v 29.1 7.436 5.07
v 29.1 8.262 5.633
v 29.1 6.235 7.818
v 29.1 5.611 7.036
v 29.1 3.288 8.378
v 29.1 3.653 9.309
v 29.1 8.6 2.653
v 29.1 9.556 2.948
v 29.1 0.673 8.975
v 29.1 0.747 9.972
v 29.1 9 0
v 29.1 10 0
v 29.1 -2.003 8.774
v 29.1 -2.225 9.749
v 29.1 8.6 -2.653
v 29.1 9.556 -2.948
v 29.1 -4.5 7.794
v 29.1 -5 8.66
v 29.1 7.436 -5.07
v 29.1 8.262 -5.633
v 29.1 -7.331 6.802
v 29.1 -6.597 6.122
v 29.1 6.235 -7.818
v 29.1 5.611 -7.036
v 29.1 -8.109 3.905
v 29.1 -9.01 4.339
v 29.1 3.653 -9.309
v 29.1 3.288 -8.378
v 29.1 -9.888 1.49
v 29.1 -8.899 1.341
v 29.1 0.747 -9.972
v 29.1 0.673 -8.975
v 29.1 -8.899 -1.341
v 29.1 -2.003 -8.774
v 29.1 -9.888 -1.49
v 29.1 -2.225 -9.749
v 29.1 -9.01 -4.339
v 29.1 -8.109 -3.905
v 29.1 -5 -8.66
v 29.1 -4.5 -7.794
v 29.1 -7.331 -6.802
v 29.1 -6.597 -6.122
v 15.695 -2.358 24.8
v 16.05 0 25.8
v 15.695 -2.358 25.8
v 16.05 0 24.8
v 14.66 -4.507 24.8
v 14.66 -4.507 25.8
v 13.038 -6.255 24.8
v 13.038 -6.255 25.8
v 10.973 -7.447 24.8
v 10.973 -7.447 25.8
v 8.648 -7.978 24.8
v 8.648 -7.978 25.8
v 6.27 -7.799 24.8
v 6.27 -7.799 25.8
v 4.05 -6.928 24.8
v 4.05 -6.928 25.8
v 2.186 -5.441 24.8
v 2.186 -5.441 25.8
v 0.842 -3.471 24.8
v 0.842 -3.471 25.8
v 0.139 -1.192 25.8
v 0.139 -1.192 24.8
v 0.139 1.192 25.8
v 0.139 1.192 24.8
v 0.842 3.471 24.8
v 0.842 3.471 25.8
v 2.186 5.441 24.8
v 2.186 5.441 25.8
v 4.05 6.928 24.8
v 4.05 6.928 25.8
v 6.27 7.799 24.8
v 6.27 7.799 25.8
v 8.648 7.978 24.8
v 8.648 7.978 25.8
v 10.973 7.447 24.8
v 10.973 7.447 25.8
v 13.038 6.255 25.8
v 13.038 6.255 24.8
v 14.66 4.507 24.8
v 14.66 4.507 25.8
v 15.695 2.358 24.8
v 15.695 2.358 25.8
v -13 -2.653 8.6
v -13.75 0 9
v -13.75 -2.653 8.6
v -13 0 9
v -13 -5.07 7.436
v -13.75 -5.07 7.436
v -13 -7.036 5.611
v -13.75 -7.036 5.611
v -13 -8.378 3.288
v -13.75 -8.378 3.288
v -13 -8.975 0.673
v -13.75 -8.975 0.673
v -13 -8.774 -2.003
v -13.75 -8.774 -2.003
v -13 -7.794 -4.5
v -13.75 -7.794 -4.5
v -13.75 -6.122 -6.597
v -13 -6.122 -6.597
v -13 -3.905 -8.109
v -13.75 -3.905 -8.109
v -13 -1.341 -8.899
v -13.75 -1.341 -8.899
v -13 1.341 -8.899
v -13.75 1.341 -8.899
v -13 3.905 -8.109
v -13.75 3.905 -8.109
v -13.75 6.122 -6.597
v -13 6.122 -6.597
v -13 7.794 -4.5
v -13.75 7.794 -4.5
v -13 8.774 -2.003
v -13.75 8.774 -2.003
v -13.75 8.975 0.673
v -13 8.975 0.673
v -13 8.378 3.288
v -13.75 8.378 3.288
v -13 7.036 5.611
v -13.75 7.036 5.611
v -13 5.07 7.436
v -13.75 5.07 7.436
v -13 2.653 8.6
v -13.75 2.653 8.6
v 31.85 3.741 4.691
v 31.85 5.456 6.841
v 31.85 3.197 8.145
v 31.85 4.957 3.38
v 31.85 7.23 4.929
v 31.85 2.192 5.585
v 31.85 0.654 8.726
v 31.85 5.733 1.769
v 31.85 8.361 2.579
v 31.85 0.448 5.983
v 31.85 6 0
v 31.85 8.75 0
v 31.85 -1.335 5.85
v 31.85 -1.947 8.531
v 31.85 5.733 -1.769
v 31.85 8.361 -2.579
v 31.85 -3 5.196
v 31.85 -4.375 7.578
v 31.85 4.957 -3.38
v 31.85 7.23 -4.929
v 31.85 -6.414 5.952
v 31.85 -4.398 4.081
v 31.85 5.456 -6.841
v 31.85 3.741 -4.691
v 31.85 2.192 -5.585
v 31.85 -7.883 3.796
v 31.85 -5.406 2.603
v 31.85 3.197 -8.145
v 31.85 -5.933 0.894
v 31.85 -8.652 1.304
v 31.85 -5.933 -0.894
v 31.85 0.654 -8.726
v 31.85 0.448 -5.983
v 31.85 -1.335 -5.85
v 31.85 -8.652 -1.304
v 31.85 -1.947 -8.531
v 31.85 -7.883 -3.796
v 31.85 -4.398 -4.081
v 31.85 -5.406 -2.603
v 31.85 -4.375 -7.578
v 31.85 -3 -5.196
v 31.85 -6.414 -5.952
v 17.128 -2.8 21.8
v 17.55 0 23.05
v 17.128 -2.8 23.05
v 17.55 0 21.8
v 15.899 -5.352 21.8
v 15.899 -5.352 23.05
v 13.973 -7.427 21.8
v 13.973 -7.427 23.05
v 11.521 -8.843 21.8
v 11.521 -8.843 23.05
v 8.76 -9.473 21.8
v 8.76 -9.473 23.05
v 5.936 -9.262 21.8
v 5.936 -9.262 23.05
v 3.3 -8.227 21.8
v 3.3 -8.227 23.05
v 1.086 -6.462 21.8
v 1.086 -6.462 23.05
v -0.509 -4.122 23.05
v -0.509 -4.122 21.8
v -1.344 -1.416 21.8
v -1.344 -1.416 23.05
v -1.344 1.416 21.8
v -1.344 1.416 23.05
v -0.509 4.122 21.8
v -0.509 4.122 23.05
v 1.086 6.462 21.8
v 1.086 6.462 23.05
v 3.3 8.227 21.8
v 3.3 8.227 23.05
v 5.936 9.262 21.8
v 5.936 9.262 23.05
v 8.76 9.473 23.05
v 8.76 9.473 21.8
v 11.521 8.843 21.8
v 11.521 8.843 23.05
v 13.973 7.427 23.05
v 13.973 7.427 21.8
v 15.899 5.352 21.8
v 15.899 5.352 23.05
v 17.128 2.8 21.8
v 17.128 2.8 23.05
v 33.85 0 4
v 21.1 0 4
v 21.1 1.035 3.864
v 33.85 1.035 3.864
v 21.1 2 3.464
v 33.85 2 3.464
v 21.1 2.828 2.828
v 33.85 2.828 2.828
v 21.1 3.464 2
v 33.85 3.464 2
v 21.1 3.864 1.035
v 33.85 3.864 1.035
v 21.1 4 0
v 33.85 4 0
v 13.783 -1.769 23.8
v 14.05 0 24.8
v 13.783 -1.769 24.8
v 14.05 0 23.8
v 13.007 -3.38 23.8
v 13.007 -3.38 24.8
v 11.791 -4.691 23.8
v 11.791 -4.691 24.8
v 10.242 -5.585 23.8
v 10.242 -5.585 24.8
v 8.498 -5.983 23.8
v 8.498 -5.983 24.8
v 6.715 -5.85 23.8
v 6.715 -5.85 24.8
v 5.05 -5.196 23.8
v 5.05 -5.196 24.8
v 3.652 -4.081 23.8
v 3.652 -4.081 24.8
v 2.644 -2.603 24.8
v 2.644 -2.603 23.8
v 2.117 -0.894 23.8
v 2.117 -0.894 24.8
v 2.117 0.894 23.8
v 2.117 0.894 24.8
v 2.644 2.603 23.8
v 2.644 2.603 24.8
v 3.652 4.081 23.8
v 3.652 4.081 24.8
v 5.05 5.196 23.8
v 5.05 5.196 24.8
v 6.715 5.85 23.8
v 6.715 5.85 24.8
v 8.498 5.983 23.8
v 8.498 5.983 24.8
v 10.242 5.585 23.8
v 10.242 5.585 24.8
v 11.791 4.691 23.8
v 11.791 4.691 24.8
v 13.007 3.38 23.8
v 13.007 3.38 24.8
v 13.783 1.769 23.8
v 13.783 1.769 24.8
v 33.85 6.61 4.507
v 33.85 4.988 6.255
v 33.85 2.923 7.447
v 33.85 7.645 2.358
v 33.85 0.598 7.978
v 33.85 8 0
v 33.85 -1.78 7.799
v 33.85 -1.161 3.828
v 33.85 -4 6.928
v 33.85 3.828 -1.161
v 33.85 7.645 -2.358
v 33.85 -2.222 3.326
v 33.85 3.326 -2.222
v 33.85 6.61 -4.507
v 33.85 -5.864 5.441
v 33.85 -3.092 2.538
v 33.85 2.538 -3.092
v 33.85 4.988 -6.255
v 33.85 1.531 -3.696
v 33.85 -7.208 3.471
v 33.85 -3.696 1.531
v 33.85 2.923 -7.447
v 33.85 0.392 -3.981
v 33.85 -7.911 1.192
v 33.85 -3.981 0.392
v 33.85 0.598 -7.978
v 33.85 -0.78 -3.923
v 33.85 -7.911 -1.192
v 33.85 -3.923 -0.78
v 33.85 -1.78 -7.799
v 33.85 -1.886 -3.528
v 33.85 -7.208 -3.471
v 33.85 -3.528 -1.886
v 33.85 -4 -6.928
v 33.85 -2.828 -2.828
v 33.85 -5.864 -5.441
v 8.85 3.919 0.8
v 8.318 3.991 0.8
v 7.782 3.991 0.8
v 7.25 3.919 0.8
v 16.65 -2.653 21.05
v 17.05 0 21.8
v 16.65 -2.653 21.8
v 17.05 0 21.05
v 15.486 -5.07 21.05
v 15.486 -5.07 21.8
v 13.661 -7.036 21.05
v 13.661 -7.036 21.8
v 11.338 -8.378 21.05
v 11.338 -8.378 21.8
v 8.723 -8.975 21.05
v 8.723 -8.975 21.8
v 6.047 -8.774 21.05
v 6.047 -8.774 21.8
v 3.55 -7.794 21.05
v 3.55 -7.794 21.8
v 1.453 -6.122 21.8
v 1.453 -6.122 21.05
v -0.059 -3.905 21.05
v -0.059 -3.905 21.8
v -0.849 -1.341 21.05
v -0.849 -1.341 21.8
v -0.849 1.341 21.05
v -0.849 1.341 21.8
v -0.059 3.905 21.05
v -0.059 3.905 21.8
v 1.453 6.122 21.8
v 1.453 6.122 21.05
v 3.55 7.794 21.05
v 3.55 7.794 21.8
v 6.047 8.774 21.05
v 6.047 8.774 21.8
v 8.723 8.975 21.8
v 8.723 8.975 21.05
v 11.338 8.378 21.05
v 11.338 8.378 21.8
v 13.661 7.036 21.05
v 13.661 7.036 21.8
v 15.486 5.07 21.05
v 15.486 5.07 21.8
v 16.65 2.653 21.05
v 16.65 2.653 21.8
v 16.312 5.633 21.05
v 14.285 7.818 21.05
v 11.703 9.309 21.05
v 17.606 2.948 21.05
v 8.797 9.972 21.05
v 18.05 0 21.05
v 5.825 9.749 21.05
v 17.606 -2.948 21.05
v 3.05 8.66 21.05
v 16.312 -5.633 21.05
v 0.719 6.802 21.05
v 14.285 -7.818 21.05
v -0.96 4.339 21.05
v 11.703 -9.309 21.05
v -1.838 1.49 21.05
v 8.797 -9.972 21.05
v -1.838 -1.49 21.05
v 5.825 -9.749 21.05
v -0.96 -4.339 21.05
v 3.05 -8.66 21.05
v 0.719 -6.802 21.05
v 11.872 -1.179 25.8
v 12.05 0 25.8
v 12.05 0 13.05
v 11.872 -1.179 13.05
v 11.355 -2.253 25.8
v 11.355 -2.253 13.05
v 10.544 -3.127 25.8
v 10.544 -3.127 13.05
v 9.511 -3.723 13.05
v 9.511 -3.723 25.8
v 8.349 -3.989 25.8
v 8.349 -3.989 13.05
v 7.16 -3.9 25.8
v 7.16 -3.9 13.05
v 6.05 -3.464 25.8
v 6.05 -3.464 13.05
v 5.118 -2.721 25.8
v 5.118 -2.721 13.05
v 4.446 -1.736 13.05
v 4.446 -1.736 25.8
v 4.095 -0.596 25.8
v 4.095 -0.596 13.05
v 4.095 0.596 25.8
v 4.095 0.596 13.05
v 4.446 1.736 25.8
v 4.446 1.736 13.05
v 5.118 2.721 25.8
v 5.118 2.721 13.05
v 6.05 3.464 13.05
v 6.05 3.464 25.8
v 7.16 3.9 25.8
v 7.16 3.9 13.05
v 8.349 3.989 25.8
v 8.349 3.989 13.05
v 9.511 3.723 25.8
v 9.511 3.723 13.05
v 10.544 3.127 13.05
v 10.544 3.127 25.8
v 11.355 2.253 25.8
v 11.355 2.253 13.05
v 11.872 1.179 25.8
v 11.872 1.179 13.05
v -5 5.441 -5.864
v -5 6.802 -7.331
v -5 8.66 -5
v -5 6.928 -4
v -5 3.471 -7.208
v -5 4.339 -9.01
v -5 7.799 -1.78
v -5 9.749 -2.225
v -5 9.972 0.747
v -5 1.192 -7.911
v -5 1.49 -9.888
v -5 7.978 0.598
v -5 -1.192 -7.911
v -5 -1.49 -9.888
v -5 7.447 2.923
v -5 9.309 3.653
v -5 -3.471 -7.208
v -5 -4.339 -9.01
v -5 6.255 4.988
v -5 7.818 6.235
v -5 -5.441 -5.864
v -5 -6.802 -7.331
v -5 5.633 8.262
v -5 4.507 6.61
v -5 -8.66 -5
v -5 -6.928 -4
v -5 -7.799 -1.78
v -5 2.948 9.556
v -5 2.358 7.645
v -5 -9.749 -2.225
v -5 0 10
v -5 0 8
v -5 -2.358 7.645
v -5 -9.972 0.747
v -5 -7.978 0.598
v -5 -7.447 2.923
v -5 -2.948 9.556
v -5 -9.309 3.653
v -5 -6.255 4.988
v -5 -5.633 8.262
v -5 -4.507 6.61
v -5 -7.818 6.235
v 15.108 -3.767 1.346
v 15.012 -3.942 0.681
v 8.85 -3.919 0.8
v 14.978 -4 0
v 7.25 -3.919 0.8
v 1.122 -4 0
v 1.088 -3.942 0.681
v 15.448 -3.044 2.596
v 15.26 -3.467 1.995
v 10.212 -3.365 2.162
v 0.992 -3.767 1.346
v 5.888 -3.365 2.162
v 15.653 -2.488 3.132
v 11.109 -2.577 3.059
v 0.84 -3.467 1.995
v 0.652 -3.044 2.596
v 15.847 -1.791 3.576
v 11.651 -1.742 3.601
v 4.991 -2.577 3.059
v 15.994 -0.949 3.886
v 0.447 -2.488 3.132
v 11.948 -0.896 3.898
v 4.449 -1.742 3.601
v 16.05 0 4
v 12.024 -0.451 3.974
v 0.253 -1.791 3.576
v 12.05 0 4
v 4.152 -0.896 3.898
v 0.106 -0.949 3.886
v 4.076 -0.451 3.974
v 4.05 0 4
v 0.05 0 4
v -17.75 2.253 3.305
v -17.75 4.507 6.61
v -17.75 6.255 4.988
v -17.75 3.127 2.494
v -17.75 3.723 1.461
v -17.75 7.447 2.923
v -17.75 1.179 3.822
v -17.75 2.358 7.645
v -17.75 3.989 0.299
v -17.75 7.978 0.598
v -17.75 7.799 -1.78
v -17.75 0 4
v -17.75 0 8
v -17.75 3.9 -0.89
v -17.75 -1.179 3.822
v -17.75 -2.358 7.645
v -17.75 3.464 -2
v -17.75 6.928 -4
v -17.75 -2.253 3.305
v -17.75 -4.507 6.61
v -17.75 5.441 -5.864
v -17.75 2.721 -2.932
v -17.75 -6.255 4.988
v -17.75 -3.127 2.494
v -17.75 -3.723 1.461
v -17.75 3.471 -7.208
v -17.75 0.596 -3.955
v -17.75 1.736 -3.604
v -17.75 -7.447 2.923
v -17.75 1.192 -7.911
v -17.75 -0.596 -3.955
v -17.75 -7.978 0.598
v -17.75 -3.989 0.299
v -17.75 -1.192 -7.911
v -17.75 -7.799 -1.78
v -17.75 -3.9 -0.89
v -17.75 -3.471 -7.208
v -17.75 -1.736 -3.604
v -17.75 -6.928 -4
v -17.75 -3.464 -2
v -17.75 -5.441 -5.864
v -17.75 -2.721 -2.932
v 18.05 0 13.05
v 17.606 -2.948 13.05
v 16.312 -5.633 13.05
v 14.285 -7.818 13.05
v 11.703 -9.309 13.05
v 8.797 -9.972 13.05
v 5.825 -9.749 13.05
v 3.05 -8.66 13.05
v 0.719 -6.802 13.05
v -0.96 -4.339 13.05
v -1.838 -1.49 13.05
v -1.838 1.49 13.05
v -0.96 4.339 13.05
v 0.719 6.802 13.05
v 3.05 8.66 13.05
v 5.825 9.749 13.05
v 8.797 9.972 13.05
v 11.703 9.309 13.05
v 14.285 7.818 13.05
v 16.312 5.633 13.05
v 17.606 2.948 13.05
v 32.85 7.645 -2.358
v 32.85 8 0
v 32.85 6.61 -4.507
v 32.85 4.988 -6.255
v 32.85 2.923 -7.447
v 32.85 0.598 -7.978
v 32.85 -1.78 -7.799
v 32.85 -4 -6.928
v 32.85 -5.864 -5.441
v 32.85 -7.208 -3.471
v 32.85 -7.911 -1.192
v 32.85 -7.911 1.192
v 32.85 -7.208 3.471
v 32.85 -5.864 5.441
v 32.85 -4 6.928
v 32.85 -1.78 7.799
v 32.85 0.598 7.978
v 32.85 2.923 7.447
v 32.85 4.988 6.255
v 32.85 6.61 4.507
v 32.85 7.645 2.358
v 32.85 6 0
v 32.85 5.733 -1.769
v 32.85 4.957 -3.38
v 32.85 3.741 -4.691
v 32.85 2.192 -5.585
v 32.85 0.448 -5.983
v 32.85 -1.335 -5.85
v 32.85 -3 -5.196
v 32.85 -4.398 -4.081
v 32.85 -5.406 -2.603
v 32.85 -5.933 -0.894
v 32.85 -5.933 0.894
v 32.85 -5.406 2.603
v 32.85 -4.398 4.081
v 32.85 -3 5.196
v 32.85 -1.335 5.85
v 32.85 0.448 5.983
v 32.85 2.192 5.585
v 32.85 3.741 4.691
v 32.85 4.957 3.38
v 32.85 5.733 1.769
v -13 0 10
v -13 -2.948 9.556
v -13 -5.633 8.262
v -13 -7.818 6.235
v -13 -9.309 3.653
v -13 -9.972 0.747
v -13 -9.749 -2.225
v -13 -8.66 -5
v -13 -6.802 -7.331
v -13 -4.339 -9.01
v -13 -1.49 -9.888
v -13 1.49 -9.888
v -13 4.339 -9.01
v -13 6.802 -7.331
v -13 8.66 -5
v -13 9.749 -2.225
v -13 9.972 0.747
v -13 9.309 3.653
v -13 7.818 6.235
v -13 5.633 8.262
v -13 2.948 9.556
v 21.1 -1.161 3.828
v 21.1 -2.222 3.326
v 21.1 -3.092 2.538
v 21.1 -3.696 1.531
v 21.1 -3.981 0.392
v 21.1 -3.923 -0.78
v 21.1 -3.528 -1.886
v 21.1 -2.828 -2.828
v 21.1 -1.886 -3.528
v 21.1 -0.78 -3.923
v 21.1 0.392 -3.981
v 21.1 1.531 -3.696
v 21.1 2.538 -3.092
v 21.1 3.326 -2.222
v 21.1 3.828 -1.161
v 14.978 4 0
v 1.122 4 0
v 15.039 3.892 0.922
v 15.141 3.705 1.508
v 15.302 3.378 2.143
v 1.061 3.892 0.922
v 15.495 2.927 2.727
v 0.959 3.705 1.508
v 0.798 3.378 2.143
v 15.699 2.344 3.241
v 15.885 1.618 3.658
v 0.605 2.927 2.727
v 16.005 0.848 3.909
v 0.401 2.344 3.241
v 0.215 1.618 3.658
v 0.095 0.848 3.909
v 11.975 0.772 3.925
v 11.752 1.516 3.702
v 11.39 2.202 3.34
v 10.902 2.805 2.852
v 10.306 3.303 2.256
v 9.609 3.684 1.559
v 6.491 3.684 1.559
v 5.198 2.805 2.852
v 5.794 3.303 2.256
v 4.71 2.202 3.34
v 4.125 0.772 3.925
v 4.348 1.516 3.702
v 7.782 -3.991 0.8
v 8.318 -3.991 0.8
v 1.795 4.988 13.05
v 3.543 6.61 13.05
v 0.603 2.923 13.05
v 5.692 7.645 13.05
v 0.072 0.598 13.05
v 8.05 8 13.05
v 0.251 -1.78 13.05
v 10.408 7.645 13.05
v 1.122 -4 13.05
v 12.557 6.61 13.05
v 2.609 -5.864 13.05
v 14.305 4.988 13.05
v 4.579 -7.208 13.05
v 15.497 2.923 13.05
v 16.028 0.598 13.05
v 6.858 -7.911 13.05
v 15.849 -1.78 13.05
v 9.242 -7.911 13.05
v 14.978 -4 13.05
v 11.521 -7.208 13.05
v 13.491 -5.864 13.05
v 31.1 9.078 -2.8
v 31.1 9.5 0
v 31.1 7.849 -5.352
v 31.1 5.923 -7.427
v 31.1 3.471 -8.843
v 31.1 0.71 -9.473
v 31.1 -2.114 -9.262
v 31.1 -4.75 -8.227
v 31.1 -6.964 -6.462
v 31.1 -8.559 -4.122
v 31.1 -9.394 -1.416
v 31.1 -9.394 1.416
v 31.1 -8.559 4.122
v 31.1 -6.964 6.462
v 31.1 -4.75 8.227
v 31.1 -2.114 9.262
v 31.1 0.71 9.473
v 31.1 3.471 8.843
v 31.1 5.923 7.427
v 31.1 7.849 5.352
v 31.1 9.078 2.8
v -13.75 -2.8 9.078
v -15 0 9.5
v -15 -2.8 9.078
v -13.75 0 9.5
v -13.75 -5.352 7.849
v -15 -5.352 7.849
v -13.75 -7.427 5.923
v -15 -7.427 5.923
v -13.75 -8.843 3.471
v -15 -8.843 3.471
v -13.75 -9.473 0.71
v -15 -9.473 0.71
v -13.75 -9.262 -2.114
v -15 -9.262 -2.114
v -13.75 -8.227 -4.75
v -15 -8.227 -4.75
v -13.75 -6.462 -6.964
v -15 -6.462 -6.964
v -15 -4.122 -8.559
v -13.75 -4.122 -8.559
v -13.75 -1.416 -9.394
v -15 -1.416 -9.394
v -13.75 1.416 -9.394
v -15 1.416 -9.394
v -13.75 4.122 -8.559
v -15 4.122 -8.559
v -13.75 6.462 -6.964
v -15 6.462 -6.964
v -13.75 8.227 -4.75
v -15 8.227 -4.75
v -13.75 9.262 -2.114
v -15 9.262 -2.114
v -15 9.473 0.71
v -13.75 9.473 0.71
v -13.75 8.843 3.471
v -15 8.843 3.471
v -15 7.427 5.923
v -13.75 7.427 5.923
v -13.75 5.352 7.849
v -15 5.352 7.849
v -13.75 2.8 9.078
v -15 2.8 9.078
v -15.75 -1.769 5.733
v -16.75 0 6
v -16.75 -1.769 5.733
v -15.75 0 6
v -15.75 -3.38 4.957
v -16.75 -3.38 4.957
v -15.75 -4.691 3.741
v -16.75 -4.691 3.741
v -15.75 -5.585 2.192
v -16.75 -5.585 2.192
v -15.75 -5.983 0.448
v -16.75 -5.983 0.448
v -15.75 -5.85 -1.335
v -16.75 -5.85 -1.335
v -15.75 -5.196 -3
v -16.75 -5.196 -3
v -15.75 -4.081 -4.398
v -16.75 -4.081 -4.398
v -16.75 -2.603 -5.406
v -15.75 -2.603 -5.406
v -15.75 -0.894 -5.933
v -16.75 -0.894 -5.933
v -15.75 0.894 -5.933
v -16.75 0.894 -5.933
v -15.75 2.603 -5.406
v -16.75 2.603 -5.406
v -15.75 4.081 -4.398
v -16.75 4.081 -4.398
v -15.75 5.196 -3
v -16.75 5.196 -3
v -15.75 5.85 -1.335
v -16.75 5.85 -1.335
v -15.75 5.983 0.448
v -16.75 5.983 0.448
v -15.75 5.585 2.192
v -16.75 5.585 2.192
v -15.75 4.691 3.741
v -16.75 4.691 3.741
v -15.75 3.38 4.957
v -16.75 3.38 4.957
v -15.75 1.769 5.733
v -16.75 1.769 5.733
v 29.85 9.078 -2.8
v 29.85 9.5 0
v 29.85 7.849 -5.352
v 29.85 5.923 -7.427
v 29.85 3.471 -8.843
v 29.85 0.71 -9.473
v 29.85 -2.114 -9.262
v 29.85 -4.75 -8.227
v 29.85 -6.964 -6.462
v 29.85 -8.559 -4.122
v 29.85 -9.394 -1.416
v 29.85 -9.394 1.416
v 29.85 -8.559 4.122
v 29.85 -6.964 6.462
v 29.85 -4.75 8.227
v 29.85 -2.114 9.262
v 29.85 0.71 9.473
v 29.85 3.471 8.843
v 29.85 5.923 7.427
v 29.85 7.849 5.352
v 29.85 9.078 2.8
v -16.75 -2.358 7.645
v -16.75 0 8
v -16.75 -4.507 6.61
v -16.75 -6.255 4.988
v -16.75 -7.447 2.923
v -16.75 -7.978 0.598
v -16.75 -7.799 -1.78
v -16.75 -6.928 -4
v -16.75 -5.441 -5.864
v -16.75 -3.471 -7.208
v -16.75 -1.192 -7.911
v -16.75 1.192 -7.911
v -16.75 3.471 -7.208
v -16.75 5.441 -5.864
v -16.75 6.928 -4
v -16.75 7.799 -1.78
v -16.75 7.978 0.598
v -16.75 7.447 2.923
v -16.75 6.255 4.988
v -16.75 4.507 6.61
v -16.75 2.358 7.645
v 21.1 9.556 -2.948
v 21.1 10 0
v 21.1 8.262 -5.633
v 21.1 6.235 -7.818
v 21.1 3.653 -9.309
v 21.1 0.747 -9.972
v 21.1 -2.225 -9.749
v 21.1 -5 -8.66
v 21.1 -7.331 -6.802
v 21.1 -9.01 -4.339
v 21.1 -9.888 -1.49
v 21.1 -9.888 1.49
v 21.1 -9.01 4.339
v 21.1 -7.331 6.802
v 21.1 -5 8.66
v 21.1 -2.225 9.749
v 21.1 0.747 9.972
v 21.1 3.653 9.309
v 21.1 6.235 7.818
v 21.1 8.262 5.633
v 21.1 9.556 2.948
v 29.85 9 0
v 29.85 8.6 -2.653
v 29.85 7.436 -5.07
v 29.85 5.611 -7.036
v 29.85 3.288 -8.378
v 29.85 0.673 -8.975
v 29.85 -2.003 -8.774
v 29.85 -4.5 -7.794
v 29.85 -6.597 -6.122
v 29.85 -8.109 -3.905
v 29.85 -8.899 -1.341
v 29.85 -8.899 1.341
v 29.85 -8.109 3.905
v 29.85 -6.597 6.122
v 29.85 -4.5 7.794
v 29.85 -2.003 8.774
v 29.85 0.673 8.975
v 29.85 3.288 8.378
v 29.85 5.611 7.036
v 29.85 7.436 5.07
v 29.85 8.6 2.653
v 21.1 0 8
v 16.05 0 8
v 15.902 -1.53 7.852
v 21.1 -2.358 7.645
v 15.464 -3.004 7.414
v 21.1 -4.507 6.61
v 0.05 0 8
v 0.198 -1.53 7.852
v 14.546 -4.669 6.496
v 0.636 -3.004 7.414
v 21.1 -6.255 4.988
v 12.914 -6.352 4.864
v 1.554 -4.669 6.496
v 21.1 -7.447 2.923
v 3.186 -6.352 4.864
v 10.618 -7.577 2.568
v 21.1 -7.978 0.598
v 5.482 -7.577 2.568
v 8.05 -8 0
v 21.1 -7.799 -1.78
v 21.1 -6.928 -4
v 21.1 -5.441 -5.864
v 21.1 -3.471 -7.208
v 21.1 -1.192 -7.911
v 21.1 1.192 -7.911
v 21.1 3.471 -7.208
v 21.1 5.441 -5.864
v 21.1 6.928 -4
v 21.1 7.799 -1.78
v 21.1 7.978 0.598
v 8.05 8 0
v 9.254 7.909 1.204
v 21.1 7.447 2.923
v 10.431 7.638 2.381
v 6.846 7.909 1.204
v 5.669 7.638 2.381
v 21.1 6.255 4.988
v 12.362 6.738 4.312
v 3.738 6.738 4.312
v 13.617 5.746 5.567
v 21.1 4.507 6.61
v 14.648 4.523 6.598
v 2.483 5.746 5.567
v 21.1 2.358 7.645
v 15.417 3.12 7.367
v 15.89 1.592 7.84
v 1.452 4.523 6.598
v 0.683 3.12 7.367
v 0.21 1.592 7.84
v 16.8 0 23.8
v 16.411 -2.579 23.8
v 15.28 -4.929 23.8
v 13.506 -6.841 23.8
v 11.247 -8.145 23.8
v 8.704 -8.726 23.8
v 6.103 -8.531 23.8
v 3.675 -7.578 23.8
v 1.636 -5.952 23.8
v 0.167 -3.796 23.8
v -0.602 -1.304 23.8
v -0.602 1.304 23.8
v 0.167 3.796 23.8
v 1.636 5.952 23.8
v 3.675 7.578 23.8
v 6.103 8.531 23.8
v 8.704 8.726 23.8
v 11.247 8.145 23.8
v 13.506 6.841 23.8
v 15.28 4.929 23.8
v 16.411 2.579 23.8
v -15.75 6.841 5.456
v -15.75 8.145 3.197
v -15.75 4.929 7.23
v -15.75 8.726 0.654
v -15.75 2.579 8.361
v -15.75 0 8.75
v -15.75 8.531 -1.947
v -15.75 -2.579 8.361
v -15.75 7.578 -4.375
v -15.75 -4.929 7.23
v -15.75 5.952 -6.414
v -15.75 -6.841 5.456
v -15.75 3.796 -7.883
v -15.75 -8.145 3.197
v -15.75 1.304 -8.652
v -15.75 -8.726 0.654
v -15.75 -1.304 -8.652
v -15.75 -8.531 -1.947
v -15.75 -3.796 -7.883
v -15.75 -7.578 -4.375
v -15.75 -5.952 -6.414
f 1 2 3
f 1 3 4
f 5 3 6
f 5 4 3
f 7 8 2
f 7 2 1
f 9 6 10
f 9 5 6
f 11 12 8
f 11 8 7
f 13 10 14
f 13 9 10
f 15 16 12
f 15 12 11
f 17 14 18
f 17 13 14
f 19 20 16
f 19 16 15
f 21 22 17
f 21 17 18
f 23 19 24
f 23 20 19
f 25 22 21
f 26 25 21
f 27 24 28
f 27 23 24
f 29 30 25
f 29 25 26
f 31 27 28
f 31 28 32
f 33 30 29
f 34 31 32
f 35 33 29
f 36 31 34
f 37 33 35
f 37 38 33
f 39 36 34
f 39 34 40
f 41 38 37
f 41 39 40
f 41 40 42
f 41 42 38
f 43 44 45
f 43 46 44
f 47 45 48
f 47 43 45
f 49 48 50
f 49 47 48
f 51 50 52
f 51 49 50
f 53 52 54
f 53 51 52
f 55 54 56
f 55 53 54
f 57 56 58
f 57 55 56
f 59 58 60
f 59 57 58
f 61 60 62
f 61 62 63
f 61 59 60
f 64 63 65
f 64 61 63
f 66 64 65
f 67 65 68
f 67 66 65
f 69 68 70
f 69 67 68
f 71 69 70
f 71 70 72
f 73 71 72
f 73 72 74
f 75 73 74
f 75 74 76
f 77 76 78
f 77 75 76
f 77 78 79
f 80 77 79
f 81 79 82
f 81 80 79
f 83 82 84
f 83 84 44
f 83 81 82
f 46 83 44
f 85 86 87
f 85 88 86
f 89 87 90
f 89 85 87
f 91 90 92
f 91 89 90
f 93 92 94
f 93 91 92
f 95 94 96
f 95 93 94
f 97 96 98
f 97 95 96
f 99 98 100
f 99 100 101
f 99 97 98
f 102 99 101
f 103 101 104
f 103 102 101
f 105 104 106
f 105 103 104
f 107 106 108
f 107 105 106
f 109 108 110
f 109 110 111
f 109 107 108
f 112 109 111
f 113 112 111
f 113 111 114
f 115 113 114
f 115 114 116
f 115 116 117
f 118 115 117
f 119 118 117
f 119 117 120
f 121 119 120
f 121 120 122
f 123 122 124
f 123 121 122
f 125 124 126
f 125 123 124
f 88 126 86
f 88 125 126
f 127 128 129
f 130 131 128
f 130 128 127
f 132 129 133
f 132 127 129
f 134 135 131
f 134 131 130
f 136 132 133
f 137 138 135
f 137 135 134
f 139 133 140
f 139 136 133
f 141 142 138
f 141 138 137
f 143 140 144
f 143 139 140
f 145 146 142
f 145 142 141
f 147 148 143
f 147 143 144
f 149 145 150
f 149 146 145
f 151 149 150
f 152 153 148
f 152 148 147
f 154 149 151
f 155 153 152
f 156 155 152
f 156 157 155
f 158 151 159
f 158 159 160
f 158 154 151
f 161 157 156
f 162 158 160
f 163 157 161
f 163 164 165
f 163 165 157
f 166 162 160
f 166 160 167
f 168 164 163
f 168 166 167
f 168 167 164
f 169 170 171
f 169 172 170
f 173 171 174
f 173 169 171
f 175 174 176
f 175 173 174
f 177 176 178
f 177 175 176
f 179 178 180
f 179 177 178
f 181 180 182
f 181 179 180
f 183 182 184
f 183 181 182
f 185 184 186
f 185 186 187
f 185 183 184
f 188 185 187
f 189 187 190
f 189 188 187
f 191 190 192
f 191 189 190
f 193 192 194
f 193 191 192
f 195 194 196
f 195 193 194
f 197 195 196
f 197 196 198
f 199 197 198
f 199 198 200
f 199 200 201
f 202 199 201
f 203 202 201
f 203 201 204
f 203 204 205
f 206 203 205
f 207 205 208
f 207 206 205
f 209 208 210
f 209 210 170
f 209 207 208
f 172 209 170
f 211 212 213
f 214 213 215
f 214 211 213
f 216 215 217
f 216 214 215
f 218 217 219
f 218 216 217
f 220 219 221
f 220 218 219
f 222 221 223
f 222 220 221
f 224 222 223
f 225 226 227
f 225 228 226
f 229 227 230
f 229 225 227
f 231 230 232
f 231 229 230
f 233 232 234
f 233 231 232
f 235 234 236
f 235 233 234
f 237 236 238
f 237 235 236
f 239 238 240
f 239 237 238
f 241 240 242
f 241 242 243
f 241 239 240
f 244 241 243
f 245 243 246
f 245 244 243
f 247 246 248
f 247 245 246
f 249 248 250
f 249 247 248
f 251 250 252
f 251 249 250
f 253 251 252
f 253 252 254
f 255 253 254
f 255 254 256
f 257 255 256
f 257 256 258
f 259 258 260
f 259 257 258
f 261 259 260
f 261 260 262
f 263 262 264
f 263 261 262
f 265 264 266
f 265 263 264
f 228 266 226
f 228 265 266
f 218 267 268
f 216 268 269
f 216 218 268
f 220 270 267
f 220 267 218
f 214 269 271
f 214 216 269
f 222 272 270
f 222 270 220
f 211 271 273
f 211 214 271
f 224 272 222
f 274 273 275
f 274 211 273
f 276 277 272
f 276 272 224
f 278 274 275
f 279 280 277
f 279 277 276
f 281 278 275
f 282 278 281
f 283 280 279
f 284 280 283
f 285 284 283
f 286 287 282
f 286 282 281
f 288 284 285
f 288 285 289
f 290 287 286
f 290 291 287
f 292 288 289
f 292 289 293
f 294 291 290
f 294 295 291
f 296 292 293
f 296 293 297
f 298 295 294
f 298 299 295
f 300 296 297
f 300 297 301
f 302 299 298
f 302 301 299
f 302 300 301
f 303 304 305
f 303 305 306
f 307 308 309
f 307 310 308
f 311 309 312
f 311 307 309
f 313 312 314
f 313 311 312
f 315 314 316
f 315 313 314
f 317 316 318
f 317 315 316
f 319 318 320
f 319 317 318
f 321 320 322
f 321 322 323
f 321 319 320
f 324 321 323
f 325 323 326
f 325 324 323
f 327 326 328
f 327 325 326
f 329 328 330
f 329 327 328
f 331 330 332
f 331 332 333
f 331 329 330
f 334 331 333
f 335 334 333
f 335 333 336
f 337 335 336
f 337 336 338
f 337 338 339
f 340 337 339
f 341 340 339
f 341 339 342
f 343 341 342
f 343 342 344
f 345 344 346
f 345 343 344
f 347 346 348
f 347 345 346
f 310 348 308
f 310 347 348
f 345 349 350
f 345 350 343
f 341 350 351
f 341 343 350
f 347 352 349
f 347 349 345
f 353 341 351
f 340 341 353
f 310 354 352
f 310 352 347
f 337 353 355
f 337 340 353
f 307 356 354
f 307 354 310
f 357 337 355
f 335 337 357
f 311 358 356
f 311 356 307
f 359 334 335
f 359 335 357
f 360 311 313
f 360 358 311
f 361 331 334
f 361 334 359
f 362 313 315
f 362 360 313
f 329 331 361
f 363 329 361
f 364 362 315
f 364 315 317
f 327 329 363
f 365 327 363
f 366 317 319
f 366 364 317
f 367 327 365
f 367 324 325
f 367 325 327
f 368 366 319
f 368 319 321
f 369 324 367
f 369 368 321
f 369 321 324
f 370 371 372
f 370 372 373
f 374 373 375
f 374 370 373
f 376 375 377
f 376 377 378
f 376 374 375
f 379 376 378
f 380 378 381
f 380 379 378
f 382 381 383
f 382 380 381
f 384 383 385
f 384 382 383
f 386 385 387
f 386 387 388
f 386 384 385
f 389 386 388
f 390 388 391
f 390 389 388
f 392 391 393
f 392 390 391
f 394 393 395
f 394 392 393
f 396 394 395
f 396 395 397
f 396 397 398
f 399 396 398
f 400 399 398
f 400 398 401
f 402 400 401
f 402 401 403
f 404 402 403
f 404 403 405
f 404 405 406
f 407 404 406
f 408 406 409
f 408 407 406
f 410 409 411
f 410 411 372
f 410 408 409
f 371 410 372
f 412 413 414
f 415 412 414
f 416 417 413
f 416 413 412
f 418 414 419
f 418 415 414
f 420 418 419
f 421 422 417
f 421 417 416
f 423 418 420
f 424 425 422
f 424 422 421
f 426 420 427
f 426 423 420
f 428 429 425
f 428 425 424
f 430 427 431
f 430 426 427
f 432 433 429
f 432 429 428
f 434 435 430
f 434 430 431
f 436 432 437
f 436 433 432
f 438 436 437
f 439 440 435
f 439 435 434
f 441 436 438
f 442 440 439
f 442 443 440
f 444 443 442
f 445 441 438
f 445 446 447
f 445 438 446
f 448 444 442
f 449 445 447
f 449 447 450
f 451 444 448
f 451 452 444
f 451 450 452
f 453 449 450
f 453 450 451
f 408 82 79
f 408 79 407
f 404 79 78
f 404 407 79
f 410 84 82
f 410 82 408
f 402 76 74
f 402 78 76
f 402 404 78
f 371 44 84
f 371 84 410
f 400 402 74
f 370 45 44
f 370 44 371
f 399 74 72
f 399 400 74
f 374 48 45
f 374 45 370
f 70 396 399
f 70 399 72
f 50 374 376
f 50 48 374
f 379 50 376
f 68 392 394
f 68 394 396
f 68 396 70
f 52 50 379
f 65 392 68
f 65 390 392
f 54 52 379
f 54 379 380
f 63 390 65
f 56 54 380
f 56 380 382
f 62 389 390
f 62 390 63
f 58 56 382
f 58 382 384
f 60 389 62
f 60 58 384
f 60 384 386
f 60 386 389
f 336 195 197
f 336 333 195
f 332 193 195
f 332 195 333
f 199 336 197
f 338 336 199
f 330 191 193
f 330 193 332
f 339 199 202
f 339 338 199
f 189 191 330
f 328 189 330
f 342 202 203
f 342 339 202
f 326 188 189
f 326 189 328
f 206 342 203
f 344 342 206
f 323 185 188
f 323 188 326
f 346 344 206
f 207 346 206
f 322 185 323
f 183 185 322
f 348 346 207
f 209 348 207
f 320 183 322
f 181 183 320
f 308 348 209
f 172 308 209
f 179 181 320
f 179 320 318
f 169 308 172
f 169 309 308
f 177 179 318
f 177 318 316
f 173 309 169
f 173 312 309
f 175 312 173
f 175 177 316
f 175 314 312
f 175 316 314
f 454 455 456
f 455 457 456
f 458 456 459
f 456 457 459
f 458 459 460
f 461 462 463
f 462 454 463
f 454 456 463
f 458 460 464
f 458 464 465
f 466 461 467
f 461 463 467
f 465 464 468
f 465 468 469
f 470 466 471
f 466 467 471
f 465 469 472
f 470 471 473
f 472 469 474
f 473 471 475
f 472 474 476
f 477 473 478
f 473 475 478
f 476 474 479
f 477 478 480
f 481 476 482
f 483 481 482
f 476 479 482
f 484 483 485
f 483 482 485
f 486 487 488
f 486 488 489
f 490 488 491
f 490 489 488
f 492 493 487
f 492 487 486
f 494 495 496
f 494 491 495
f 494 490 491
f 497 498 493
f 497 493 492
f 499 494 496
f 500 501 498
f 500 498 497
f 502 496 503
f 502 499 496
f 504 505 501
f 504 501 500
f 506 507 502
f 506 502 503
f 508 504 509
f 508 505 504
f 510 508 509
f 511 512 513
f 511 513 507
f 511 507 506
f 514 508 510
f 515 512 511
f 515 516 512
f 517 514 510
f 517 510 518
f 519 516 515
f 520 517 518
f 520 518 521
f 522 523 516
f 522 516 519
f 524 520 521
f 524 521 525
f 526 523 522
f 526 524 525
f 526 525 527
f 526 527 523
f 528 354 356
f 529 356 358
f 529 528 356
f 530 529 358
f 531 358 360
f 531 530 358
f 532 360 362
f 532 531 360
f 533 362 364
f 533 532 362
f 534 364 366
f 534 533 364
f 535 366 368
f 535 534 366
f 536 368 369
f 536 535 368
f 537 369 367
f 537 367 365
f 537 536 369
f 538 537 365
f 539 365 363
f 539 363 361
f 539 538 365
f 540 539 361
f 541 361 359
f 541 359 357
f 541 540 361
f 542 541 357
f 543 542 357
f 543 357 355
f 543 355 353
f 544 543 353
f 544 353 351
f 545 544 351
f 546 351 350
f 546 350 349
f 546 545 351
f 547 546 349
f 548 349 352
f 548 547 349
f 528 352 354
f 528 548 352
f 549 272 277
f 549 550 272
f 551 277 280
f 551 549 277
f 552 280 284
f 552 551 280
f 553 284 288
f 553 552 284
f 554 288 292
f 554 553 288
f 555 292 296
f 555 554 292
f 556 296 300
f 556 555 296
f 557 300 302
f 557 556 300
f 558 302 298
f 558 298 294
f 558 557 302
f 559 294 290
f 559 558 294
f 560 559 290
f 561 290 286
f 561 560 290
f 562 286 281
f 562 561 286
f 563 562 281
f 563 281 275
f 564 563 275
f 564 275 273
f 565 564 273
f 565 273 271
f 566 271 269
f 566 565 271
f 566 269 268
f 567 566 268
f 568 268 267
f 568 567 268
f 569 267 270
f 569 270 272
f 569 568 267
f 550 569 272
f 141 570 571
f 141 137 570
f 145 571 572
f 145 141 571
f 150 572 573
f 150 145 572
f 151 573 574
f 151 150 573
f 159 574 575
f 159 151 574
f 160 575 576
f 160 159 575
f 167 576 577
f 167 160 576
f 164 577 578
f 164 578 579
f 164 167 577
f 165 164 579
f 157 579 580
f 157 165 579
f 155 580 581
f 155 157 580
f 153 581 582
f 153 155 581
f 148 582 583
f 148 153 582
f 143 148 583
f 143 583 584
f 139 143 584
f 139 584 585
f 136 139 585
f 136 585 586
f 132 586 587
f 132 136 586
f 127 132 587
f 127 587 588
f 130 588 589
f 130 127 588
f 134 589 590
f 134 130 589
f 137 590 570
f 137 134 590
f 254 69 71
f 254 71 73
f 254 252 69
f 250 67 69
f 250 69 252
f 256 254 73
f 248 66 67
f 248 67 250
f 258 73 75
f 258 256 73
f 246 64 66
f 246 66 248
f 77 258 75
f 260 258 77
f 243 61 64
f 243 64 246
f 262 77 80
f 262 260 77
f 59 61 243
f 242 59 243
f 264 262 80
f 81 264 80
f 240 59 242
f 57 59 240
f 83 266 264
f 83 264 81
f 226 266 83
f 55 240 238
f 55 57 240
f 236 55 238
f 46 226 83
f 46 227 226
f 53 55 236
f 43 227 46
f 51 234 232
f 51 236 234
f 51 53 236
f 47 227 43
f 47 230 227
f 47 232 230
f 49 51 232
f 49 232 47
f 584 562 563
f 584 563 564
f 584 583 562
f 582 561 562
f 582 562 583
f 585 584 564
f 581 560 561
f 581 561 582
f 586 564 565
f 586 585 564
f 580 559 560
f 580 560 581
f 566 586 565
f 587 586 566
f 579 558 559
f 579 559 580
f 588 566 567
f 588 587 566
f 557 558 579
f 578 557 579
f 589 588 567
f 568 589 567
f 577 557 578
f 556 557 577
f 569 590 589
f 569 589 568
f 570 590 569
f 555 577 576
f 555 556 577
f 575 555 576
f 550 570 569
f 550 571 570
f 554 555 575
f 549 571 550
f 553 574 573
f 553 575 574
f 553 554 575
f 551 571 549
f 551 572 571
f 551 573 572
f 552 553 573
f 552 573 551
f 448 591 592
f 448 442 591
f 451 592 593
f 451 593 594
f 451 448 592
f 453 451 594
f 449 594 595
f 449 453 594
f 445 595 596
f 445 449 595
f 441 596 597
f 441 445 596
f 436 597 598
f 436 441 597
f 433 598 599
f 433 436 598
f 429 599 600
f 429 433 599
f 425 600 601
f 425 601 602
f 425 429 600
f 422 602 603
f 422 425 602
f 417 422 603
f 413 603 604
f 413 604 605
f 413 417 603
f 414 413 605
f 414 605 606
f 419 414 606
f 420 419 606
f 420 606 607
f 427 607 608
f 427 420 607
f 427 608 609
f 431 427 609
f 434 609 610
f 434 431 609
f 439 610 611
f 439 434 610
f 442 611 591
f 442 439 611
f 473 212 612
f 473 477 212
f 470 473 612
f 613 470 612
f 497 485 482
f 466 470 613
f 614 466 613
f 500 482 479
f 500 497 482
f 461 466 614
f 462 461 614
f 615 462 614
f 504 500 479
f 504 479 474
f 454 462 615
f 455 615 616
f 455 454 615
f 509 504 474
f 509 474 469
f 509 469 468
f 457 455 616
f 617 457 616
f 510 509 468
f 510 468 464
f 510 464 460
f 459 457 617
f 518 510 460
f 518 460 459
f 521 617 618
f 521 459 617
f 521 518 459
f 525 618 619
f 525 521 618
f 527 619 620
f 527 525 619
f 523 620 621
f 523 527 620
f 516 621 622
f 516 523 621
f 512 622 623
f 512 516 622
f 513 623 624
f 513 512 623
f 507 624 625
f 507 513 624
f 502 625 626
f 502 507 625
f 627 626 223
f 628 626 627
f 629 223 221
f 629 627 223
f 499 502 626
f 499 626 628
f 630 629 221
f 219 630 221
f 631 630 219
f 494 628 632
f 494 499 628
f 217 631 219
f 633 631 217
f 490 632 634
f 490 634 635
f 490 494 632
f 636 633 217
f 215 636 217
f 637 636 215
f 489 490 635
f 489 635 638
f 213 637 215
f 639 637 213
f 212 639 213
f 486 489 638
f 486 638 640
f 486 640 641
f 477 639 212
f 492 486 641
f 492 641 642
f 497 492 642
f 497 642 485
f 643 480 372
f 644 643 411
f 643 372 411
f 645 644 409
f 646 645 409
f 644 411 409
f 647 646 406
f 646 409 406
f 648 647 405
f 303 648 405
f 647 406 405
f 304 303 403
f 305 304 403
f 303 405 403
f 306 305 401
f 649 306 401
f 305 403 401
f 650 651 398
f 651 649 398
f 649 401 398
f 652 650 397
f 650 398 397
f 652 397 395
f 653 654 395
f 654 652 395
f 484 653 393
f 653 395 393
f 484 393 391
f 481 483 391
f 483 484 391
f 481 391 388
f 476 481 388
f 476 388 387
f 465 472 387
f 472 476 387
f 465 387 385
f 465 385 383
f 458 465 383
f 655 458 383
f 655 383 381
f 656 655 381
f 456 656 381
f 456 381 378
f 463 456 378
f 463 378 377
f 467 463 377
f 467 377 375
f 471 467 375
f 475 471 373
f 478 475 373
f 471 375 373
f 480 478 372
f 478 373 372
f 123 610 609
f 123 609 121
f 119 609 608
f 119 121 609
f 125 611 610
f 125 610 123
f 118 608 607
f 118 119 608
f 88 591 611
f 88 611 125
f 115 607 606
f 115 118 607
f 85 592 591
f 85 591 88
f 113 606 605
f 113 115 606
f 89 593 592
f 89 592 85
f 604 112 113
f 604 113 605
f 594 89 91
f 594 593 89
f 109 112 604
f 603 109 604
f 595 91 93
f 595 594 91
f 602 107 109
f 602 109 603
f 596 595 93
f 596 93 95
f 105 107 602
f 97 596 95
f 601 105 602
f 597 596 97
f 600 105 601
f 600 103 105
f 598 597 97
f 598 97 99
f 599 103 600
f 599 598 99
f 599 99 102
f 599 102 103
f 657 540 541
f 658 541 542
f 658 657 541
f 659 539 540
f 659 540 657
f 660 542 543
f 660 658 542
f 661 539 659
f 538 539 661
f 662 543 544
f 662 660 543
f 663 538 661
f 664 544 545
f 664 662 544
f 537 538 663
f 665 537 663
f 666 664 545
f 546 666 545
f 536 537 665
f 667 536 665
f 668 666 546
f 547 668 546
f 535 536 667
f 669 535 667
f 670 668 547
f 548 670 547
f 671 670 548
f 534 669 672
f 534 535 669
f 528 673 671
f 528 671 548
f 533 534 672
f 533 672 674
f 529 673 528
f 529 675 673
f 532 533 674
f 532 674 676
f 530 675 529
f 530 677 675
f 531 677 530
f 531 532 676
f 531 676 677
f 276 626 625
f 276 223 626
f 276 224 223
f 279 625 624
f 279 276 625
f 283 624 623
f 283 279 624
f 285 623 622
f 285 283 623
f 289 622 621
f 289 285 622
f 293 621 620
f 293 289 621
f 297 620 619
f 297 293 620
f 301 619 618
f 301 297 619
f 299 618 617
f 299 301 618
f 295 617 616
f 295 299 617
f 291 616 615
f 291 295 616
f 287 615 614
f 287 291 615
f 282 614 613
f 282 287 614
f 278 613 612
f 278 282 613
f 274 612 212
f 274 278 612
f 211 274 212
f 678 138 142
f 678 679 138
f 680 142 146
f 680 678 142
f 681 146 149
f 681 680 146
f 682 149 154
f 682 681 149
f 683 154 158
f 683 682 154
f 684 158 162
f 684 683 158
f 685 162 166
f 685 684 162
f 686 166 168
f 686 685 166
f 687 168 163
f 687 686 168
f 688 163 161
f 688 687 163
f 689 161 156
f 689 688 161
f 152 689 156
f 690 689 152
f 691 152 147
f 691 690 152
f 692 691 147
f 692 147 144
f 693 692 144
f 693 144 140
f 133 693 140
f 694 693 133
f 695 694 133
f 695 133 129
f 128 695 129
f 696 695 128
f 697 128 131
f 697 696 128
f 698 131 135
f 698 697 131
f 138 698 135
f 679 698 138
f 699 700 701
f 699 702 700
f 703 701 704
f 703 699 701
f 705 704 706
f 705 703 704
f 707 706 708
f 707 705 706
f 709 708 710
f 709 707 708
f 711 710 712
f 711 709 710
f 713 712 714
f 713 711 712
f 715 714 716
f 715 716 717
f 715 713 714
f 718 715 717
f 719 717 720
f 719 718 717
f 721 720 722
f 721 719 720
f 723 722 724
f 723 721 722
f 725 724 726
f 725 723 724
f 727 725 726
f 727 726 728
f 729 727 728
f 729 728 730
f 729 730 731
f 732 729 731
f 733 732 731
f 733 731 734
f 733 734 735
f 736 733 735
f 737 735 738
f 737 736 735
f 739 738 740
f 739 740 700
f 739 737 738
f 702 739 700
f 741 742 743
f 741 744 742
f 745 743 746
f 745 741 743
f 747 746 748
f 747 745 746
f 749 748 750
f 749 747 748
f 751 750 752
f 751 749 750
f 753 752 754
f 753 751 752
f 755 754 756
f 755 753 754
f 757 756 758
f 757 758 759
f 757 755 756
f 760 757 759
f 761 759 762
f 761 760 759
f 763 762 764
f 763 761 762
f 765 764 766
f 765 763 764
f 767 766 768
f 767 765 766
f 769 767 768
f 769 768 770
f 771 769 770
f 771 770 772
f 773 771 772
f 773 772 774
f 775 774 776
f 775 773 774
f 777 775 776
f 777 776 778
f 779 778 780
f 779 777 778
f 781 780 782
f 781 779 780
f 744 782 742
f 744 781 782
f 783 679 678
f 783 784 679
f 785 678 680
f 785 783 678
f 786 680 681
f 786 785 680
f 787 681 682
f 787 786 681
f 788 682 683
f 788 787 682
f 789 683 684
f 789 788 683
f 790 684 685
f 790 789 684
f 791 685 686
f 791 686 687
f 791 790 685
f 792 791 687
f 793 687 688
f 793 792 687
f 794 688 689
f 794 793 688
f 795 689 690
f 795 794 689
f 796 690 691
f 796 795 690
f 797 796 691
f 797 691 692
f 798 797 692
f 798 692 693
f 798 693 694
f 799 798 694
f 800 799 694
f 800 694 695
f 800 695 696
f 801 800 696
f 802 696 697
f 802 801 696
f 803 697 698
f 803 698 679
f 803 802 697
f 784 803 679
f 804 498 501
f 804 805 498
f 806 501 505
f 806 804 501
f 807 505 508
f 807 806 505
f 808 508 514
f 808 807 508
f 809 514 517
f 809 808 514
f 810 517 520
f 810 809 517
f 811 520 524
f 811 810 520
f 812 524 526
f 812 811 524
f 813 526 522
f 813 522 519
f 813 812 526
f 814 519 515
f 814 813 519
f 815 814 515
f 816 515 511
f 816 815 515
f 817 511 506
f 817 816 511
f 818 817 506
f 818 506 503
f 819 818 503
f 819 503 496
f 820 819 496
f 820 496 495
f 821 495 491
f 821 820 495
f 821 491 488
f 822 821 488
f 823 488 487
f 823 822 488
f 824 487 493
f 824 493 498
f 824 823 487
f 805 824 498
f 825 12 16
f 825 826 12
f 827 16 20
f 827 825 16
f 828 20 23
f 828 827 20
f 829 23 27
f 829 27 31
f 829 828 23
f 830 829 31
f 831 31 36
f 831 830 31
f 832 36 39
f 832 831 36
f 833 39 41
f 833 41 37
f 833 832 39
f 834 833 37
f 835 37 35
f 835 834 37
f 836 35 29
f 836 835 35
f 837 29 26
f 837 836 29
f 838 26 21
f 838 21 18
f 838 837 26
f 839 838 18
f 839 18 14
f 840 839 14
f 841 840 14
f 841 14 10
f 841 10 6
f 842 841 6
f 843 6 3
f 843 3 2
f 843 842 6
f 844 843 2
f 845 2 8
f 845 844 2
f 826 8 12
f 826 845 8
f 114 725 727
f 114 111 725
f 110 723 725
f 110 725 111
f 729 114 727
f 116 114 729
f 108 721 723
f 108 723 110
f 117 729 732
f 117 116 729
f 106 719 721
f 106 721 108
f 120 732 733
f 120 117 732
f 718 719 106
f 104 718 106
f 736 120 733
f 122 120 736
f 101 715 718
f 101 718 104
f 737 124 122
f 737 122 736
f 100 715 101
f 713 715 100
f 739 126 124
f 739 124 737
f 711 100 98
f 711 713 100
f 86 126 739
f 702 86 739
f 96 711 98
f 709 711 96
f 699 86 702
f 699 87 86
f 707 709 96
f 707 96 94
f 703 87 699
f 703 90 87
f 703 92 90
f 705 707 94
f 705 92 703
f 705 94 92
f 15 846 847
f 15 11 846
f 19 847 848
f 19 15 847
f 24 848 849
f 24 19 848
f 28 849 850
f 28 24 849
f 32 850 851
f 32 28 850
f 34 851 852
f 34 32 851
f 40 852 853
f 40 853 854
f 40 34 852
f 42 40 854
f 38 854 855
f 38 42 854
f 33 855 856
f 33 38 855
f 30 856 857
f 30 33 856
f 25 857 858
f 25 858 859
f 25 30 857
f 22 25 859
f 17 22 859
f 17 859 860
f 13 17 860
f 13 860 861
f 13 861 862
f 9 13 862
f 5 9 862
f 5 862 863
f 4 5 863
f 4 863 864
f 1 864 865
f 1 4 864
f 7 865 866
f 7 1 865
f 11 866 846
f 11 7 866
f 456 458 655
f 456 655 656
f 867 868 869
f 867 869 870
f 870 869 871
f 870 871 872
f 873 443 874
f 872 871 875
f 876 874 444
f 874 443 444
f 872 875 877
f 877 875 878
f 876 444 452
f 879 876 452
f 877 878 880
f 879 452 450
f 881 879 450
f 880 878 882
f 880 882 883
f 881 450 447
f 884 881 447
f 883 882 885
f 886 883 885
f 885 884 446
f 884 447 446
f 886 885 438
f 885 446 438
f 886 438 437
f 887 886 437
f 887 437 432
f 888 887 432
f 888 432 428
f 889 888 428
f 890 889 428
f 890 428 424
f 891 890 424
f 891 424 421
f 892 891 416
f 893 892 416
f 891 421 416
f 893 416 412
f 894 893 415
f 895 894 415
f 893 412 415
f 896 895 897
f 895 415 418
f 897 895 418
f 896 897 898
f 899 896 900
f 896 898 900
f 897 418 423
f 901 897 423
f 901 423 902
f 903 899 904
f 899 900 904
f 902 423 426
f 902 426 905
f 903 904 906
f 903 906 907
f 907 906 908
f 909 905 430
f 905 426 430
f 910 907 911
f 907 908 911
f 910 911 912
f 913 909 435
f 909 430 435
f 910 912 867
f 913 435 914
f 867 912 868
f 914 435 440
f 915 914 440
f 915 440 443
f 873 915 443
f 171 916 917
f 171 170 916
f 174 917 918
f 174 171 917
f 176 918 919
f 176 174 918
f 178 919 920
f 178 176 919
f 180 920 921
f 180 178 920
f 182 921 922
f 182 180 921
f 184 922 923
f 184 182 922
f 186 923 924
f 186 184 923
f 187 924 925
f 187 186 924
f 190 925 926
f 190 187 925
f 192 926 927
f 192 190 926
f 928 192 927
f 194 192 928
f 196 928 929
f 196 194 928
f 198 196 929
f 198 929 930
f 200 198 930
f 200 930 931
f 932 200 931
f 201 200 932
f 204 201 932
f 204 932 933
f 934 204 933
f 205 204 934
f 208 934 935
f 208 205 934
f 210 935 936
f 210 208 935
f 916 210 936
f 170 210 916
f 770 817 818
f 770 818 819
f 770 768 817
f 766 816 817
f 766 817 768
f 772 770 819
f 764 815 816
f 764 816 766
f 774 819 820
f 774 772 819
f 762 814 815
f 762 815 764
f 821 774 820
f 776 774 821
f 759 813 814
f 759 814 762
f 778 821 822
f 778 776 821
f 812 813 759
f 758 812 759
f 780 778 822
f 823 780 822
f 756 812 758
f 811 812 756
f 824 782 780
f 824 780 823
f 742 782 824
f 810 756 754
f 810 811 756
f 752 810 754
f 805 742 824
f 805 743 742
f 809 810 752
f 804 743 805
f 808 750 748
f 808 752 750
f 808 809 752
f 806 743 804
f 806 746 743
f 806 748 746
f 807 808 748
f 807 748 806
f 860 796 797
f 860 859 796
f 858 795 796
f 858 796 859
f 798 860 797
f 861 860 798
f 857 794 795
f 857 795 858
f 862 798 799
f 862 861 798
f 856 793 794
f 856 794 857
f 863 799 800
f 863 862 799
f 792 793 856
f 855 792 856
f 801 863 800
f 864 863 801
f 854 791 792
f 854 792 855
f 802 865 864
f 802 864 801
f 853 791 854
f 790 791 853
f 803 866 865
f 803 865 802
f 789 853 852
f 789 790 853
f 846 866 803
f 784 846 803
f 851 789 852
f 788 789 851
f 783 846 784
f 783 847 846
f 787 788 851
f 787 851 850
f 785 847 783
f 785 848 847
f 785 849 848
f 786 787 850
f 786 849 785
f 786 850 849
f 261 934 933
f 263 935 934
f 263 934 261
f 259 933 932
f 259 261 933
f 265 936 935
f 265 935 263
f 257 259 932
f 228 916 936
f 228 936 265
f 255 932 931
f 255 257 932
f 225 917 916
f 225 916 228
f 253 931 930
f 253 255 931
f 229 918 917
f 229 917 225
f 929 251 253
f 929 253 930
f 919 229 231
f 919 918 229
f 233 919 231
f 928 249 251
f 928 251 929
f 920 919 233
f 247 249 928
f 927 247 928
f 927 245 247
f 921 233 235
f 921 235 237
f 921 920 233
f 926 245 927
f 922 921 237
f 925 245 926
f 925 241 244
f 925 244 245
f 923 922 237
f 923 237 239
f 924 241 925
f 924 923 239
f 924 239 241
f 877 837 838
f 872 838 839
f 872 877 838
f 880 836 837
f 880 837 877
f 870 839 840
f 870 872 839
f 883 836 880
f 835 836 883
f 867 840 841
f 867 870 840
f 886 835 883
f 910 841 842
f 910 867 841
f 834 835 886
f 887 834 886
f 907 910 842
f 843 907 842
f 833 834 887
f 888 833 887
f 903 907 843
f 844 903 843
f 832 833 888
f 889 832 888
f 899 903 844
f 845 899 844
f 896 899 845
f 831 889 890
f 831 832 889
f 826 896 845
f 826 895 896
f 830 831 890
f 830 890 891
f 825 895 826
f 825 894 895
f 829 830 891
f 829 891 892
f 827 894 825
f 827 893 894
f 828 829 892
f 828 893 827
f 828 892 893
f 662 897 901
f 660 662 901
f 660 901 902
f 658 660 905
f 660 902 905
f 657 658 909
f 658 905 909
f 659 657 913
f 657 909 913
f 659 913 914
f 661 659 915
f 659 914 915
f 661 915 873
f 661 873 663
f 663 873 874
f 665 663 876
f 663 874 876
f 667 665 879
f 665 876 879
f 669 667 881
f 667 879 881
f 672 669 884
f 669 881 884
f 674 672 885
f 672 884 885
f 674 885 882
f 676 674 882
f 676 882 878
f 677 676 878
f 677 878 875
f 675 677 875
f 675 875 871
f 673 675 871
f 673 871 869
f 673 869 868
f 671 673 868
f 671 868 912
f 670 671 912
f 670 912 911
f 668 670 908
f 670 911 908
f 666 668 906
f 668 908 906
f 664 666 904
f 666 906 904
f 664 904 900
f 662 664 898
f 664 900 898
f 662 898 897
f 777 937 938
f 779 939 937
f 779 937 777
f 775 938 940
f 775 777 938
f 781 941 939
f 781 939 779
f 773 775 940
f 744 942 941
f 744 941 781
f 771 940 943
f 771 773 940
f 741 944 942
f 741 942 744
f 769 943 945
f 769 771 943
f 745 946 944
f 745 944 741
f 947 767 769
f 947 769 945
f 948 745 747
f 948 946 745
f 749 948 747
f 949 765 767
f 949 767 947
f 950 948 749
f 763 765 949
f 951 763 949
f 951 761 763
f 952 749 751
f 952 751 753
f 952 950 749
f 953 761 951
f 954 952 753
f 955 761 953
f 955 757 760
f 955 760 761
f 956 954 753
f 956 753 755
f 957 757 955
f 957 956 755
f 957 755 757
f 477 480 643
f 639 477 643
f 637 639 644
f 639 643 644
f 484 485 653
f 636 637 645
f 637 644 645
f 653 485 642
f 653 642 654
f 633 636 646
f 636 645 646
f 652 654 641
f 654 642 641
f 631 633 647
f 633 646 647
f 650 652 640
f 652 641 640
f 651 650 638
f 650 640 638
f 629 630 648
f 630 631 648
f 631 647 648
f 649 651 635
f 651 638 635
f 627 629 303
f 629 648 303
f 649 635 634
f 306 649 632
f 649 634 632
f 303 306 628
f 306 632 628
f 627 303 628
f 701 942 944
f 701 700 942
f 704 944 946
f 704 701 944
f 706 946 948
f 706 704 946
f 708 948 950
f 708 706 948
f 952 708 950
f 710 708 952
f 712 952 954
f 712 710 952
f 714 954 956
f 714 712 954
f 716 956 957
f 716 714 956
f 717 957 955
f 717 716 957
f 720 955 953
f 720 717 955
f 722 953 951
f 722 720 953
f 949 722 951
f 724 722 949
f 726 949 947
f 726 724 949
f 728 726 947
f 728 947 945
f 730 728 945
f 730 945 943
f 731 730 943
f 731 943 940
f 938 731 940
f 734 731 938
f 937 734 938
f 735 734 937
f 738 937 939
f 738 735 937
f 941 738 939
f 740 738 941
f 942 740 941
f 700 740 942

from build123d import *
from build123d.topology import SkipClean

# Parameters (mm, degrees)
SKETCH_2_R          = 8
SKETCH_2_R_2        = 4
EXTRUDE_1_DEPTH     = 26.1
SKETCH_4_R          = 8
EXTRUDE_2_DEPTH     = 13.05
SKETCH_6_R          = 4
CUT_EXTRUDE_1_DEPTH = 63.05
SKETCH_7_R          = 4
CUT_EXTRUDE_2_DEPTH = 25


with BuildPart() as part:
    # Эскиз1 → Повернуть1 (revolve)
    with BuildSketch(Plane.XY, mode=Mode.PRIVATE) as revolve_1_sk:
        Polygon((-16.75, -8), (-16.75, -6), (-15.75, -6), (-15.75, -8.75), (-15, -9.5), (-13.75, -9.5), (-13.75, -9), (-13, -9), (-13, -10), (-5, -10), (-5, -4), (-17.75, -4), (-17.75, -8), align=None)
    revolve(revolve_1_sk.sketch.rotate(Axis((-21.049489232, 0, 0), (1, 0, 0)), 270), axis=Axis((-21.049489232, 0, 0), (1, 0, 0)))

    # Эскиз2 → Бобышка-Вытянуть1 (add)
    with BuildSketch(Plane(origin=(-5, 0, 0), x_dir=(0, 0, -1), z_dir=(1, 0, 0))):
        with Locations(Location((0, 0, 0), (0, 0, 180))):
            Circle(SKETCH_2_R)
        with Locations(Location((0, 0, 0), (0, 0, 180))):
            Circle(SKETCH_2_R_2, mode=Mode.SUBTRACT)
    extrude(amount=EXTRUDE_1_DEPTH)

    # Эскиз3 → Повернуть2 (revolve)
    with SkipClean():  # the faces are left unmerged after this step: merging them gives an invalid solid
        with BuildSketch(Plane.XY):
            Polygon((32.85, 8), (32.85, 6), (31.85, 6), (31.85, 8.75), (31.1, 9.5), (29.85, 9.5), (29.85, 9), (29.1, 9), (29.1, 10), (21.1, 10), (21.1, 4), (33.85, 4), (33.85, 8), align=None)
        revolve(axis=Axis((47.149489232, 0, 0), (-1, 0, 0)))

    # Эскиз4 → Бобышка-Вытянуть2 (add)
    with SkipClean():  # the faces are left unmerged after this step: merging them gives an invalid solid
        with BuildSketch(Plane.XY):
            with Locations(Location((8.05, 0, 0), (0, 0, 90))):
                Circle(SKETCH_4_R)
        extrude(amount=EXTRUDE_2_DEPTH)

    # Эскиз5 → Повернуть3 (revolve)
    with SkipClean():  # the faces are left unmerged after this step: merging them gives an invalid solid
        with BuildSketch(Plane(origin=(0, 0, 0), x_dir=(1, 0, 0), z_dir=(0, 1, 0))):
            Polygon((16.05, -24.8), (14.05, -24.8), (14.05, -23.8), (16.8, -23.8), (17.55, -23.05), (17.55, -21.8), (17.05, -21.8), (17.05, -21.05), (18.05, -21.05), (18.05, -13.05), (12.05, -13.05), (12.05, -25.8), (16.05, -25.8), align=None)
        revolve(axis=Axis((8.05, 0, 29.099489232), (0, 0, -1)))

    # Эскиз6 → Вырез-Вытянуть1 (cut)
    with SkipClean():  # the faces are left unmerged after this step: merging them gives an invalid solid
        with BuildSketch(Plane.ZY.offset(17.75)):
            Circle(SKETCH_6_R)
        extrude(amount=-CUT_EXTRUDE_1_DEPTH, mode=Mode.SUBTRACT)

    # Эскиз7 → Вырез-Вытянуть2 (cut)
    with SkipClean():  # the faces are left unmerged after this step: merging them gives an invalid solid
        with BuildSketch(Plane.XY.offset(25.8)):
            with Locations((8.05, 0)):
                Circle(SKETCH_7_R)
        extrude(amount=-CUT_EXTRUDE_2_DEPTH, mode=Mode.SUBTRACT)


solid = part.part
